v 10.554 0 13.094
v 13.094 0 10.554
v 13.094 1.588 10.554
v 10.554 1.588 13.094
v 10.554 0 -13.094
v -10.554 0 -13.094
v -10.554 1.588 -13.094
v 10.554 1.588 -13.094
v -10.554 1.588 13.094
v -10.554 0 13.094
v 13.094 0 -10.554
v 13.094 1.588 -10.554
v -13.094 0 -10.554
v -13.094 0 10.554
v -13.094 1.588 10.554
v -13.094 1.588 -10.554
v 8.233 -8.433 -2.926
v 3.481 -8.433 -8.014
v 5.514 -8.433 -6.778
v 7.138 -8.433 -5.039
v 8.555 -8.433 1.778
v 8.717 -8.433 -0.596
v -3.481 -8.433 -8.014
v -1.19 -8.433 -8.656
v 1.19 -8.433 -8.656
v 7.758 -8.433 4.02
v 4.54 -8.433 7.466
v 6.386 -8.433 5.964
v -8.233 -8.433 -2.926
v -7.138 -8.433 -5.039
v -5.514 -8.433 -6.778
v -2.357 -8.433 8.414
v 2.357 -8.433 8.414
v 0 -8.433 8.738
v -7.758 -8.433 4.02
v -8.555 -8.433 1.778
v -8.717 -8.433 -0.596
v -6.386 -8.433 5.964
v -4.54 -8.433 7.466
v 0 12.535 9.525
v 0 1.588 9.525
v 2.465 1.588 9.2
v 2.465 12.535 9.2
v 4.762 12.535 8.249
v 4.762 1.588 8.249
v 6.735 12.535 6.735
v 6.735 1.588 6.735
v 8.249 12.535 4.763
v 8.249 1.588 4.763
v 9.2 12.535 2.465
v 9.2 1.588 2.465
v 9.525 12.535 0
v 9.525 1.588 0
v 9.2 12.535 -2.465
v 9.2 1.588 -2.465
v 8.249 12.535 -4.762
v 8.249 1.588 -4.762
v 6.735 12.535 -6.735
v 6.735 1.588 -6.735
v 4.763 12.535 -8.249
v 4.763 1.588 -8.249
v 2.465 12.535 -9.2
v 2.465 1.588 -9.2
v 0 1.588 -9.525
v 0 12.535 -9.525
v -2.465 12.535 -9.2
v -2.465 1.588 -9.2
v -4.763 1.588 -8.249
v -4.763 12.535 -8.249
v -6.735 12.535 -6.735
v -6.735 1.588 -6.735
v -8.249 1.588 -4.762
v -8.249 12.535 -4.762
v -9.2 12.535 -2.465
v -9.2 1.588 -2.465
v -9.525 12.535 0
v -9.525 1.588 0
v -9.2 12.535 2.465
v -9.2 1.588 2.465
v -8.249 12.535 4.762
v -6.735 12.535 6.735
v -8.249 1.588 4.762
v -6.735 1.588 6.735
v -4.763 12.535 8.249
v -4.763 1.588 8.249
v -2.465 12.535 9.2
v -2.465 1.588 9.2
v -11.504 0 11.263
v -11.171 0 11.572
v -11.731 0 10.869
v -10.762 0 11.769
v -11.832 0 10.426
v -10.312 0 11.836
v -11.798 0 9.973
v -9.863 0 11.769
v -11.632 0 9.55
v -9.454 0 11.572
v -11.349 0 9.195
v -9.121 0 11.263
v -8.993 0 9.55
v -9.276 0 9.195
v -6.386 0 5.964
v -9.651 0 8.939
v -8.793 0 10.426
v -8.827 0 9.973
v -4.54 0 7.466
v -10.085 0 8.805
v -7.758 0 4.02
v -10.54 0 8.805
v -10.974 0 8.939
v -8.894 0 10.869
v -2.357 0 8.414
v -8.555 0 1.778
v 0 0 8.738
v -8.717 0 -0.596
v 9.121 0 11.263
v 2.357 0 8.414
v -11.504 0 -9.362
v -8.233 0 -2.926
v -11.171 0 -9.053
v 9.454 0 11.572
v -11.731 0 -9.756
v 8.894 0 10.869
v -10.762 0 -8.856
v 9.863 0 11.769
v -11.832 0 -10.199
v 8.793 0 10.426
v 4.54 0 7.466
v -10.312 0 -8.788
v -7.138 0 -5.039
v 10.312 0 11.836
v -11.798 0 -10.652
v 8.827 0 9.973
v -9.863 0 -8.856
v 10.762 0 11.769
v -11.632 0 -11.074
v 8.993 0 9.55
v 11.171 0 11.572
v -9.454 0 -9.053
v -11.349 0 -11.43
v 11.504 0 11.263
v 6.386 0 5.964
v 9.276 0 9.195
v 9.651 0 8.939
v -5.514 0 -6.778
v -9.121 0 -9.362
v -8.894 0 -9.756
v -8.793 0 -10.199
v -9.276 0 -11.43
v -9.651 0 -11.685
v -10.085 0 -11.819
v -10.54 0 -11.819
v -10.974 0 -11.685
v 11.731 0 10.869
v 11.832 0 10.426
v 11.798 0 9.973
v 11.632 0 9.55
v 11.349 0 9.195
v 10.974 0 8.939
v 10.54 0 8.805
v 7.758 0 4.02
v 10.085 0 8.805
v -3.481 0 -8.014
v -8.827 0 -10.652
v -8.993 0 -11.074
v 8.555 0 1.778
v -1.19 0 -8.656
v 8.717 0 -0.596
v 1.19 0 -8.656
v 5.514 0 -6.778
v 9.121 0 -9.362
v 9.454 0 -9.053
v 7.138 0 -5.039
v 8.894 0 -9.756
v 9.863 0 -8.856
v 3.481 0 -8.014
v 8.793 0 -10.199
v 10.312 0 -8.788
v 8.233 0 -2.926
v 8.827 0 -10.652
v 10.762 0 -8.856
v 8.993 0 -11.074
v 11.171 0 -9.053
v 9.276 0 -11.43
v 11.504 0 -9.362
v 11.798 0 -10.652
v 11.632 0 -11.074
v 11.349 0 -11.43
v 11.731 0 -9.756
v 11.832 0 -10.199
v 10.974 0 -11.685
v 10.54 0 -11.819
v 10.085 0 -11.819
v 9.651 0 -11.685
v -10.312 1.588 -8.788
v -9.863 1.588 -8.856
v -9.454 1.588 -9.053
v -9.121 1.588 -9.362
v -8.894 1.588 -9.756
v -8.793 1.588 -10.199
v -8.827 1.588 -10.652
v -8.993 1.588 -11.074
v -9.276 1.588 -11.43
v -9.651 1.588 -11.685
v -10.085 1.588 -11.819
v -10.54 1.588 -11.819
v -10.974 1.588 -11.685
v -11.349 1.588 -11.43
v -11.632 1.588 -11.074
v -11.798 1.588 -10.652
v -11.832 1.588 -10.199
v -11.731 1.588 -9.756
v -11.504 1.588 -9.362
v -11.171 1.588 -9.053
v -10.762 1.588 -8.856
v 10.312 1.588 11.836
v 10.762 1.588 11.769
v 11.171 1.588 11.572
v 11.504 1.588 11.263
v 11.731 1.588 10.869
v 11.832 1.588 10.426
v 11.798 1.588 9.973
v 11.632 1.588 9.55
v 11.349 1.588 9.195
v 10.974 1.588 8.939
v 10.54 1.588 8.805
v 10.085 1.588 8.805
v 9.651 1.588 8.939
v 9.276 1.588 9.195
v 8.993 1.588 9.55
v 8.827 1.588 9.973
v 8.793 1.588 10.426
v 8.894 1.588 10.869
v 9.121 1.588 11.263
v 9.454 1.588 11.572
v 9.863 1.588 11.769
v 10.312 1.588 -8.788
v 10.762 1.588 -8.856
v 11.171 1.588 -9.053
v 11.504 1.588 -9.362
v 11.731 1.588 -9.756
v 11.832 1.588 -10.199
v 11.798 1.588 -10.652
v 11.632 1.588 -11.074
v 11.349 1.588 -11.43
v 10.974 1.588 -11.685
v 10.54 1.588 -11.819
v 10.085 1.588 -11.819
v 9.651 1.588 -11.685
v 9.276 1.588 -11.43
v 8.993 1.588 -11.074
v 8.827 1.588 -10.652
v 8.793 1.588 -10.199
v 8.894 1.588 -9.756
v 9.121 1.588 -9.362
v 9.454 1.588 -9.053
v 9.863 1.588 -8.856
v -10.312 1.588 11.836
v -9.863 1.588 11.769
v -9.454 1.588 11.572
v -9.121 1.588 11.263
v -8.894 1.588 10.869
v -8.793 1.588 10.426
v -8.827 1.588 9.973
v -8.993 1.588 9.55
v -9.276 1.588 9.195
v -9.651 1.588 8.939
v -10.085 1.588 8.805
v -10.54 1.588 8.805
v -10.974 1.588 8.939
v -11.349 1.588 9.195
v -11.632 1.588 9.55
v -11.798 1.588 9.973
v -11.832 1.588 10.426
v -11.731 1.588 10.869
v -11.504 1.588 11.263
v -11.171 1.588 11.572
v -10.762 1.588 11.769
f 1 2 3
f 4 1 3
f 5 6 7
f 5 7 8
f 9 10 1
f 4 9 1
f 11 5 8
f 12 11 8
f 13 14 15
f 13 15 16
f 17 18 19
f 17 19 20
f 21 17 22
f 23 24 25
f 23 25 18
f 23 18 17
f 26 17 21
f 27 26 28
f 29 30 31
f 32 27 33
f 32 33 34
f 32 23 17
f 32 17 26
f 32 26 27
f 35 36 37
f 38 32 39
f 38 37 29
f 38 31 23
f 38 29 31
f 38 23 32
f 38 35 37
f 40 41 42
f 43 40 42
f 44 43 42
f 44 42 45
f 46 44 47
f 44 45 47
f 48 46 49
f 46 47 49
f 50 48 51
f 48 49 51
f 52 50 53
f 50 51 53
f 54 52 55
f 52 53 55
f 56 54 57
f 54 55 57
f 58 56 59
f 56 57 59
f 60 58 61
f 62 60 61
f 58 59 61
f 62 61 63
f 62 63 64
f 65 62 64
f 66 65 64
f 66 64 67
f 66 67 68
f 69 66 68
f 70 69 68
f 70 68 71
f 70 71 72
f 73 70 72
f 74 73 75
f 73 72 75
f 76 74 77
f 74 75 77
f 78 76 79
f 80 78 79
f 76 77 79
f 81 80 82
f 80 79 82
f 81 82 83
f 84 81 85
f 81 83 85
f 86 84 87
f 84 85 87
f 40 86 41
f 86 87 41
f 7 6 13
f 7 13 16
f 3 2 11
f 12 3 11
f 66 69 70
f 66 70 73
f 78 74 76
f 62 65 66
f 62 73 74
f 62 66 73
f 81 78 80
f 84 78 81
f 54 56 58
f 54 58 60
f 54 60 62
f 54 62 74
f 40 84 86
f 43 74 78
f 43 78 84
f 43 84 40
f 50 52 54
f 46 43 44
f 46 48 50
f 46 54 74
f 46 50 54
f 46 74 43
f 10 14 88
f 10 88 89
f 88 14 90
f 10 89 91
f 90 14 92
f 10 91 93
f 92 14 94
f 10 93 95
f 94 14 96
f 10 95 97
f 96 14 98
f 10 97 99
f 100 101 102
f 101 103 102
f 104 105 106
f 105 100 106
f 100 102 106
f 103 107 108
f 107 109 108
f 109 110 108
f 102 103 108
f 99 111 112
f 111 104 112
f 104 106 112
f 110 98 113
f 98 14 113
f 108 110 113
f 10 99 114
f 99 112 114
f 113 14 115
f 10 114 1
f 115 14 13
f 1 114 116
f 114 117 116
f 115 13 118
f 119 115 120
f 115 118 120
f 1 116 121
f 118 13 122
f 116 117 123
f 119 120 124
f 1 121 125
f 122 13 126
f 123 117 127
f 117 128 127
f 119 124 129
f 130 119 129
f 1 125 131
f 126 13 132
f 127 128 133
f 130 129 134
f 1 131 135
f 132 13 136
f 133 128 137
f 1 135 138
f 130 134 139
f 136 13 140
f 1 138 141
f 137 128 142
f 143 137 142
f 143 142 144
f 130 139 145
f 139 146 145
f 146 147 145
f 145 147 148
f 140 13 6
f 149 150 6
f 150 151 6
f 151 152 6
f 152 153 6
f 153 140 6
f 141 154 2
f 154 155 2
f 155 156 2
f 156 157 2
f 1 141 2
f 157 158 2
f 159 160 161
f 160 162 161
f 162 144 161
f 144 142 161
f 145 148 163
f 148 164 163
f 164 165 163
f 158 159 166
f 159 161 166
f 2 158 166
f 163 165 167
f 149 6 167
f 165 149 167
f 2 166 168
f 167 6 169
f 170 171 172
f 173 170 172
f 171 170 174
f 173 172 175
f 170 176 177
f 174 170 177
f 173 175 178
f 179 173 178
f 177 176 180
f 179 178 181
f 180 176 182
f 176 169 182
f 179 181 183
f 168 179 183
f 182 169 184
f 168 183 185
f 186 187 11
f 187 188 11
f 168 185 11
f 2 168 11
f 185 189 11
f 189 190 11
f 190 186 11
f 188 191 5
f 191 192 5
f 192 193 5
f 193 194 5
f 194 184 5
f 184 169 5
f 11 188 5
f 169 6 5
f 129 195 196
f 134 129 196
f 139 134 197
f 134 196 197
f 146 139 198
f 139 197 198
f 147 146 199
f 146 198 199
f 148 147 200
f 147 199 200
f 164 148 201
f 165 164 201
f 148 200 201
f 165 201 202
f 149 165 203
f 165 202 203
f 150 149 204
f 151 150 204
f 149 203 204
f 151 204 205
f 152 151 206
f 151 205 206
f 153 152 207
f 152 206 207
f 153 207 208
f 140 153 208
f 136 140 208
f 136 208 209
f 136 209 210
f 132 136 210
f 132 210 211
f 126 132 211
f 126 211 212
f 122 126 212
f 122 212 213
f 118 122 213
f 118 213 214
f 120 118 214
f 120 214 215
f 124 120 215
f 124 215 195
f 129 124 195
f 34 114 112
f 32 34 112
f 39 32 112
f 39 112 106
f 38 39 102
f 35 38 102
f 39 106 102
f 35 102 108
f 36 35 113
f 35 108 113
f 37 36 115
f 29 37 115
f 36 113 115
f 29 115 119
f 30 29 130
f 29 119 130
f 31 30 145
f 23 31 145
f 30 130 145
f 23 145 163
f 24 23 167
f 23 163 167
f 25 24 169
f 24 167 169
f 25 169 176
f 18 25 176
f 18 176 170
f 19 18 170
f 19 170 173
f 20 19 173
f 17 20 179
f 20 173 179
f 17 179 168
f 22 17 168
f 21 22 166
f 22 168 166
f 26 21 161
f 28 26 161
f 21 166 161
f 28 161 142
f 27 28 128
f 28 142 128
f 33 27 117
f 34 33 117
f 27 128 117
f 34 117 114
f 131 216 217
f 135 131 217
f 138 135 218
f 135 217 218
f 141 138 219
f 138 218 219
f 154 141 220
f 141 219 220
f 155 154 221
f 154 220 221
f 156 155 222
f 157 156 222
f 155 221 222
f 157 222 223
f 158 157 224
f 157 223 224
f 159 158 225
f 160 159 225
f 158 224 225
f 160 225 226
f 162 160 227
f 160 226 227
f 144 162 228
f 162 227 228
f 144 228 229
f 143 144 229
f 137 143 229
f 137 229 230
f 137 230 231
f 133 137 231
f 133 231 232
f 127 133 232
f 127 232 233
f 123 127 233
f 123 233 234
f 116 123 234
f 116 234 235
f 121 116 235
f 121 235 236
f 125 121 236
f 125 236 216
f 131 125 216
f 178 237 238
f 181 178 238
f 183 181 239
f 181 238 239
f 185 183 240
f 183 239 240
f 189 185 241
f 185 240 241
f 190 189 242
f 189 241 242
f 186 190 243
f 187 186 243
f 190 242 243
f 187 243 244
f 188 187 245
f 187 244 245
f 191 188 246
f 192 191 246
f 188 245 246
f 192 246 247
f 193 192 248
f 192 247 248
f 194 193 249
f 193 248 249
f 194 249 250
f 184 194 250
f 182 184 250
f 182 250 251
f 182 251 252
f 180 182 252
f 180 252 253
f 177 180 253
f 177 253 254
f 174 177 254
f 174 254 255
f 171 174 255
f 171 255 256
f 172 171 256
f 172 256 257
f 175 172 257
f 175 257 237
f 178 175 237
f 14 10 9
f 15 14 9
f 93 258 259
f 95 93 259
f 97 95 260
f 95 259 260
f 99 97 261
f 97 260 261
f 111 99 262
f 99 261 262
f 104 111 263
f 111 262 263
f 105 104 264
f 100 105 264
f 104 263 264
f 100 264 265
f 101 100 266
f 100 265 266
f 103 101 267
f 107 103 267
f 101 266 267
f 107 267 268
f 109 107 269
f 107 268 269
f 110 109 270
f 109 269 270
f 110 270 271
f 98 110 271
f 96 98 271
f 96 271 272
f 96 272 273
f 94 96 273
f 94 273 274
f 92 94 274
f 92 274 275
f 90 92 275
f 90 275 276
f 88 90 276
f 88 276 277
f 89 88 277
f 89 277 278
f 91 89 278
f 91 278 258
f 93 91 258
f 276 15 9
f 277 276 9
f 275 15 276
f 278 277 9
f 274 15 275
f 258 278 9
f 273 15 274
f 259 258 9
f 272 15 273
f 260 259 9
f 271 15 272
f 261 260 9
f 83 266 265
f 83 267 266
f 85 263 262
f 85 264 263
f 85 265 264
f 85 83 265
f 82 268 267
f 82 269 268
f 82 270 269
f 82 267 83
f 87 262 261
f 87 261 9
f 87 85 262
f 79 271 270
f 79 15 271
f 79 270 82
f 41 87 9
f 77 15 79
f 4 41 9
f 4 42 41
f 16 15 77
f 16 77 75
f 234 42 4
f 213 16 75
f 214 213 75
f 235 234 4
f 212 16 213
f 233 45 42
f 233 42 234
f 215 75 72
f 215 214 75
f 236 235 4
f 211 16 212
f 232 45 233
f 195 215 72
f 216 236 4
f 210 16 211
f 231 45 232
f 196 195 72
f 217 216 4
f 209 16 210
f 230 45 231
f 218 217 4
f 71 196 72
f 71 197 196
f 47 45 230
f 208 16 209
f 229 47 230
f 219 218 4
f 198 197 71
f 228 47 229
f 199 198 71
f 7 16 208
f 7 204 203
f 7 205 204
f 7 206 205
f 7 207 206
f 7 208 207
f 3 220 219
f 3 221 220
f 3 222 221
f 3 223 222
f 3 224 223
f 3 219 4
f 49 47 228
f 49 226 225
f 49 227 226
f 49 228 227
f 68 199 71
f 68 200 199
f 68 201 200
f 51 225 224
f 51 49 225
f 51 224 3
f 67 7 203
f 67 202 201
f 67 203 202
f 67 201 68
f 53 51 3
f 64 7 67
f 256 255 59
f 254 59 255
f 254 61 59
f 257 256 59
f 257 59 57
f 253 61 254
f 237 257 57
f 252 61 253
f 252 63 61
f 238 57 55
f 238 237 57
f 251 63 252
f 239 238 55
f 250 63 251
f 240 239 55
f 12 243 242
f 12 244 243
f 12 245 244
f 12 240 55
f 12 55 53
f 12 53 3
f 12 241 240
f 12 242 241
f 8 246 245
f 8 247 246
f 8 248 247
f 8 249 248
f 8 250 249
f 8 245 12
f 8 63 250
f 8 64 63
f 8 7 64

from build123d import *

# Parameters (mm, degrees)
SKETCH1_W           = 26.1874
SKETCH1_H           = 26.1874
BOSS_EXTRUDE1_DEPTH = 1.5875
CHAMFER1_SIZE       = 2.54
SKETCH2_R           = 1.524
CUT_EXTRUDE1_DEPTH  = 19.585212284
SKETCH3_R           = 9.525
BOSS_EXTRUDE2_DEPTH = 10.9474
SKETCH4_R           = 8.7376
BOSS_EXTRUDE3_DEPTH = 8.4328


with BuildPart() as part:
    # Sketch1 → Boss-Extrude1 (new body)
    with BuildSketch(Plane(origin=(0, 0, 0), x_dir=(1, 0, 0), z_dir=(0, 1, 0))):
        Rectangle(SKETCH1_W, SKETCH1_H)
    extrude(amount=BOSS_EXTRUDE1_DEPTH)

    # Chamfer1
    chamfer1_edges = [part.edges().sort_by_distance(p)[0] for p in [
        (13.0937, 0.79375, 13.0937),
        (-13.0937, 0.79375, 13.0937),
        (-13.0937, 0.79375, -13.0937),
        (13.0937, 0.79375, -13.0937),
    ]]
    chamfer(chamfer1_edges, length=CHAMFER1_SIZE)

    # Sketch2 → Cut-Extrude1 (cut, through all)
    with BuildSketch(Plane(origin=(0, 1.5875, 0), x_dir=(1, 0, 0), z_dir=(0, 1, 0))):
        with Locations(Location((-10.3124, 10.3124, 0), (0, 0, 270))):
            Circle(SKETCH2_R)
        with Locations(Location((10.3124, 10.3124, 0), (0, 0, 270))):
            Circle(SKETCH2_R)
        with Locations(Location((10.3124, -10.3124, 0), (0, 0, 270))):
            Circle(SKETCH2_R)
        with Locations(Location((-10.3124, -10.3124, 0), (0, 0, 270))):
            Circle(SKETCH2_R)
    extrude(amount=-CUT_EXTRUDE1_DEPTH, mode=Mode.SUBTRACT)

    # Sketch3 → Boss-Extrude2 (add)
    with BuildSketch(Plane(origin=(0, 1.5875, 0), x_dir=(1, 0, 0), z_dir=(0, 1, 0))):
        with Locations(Location((0, 0, 0), (0, 0, 270))):
            Circle(SKETCH3_R)
    extrude(amount=BOSS_EXTRUDE2_DEPTH)

    # Sketch4 → Boss-Extrude3 (add)
    with BuildSketch(Plane.XZ):
        with Locations(Location((0, 0, 0), (0, 0, 90))):
            Circle(SKETCH4_R)
    extrude(amount=BOSS_EXTRUDE3_DEPTH)


solid = part.part
